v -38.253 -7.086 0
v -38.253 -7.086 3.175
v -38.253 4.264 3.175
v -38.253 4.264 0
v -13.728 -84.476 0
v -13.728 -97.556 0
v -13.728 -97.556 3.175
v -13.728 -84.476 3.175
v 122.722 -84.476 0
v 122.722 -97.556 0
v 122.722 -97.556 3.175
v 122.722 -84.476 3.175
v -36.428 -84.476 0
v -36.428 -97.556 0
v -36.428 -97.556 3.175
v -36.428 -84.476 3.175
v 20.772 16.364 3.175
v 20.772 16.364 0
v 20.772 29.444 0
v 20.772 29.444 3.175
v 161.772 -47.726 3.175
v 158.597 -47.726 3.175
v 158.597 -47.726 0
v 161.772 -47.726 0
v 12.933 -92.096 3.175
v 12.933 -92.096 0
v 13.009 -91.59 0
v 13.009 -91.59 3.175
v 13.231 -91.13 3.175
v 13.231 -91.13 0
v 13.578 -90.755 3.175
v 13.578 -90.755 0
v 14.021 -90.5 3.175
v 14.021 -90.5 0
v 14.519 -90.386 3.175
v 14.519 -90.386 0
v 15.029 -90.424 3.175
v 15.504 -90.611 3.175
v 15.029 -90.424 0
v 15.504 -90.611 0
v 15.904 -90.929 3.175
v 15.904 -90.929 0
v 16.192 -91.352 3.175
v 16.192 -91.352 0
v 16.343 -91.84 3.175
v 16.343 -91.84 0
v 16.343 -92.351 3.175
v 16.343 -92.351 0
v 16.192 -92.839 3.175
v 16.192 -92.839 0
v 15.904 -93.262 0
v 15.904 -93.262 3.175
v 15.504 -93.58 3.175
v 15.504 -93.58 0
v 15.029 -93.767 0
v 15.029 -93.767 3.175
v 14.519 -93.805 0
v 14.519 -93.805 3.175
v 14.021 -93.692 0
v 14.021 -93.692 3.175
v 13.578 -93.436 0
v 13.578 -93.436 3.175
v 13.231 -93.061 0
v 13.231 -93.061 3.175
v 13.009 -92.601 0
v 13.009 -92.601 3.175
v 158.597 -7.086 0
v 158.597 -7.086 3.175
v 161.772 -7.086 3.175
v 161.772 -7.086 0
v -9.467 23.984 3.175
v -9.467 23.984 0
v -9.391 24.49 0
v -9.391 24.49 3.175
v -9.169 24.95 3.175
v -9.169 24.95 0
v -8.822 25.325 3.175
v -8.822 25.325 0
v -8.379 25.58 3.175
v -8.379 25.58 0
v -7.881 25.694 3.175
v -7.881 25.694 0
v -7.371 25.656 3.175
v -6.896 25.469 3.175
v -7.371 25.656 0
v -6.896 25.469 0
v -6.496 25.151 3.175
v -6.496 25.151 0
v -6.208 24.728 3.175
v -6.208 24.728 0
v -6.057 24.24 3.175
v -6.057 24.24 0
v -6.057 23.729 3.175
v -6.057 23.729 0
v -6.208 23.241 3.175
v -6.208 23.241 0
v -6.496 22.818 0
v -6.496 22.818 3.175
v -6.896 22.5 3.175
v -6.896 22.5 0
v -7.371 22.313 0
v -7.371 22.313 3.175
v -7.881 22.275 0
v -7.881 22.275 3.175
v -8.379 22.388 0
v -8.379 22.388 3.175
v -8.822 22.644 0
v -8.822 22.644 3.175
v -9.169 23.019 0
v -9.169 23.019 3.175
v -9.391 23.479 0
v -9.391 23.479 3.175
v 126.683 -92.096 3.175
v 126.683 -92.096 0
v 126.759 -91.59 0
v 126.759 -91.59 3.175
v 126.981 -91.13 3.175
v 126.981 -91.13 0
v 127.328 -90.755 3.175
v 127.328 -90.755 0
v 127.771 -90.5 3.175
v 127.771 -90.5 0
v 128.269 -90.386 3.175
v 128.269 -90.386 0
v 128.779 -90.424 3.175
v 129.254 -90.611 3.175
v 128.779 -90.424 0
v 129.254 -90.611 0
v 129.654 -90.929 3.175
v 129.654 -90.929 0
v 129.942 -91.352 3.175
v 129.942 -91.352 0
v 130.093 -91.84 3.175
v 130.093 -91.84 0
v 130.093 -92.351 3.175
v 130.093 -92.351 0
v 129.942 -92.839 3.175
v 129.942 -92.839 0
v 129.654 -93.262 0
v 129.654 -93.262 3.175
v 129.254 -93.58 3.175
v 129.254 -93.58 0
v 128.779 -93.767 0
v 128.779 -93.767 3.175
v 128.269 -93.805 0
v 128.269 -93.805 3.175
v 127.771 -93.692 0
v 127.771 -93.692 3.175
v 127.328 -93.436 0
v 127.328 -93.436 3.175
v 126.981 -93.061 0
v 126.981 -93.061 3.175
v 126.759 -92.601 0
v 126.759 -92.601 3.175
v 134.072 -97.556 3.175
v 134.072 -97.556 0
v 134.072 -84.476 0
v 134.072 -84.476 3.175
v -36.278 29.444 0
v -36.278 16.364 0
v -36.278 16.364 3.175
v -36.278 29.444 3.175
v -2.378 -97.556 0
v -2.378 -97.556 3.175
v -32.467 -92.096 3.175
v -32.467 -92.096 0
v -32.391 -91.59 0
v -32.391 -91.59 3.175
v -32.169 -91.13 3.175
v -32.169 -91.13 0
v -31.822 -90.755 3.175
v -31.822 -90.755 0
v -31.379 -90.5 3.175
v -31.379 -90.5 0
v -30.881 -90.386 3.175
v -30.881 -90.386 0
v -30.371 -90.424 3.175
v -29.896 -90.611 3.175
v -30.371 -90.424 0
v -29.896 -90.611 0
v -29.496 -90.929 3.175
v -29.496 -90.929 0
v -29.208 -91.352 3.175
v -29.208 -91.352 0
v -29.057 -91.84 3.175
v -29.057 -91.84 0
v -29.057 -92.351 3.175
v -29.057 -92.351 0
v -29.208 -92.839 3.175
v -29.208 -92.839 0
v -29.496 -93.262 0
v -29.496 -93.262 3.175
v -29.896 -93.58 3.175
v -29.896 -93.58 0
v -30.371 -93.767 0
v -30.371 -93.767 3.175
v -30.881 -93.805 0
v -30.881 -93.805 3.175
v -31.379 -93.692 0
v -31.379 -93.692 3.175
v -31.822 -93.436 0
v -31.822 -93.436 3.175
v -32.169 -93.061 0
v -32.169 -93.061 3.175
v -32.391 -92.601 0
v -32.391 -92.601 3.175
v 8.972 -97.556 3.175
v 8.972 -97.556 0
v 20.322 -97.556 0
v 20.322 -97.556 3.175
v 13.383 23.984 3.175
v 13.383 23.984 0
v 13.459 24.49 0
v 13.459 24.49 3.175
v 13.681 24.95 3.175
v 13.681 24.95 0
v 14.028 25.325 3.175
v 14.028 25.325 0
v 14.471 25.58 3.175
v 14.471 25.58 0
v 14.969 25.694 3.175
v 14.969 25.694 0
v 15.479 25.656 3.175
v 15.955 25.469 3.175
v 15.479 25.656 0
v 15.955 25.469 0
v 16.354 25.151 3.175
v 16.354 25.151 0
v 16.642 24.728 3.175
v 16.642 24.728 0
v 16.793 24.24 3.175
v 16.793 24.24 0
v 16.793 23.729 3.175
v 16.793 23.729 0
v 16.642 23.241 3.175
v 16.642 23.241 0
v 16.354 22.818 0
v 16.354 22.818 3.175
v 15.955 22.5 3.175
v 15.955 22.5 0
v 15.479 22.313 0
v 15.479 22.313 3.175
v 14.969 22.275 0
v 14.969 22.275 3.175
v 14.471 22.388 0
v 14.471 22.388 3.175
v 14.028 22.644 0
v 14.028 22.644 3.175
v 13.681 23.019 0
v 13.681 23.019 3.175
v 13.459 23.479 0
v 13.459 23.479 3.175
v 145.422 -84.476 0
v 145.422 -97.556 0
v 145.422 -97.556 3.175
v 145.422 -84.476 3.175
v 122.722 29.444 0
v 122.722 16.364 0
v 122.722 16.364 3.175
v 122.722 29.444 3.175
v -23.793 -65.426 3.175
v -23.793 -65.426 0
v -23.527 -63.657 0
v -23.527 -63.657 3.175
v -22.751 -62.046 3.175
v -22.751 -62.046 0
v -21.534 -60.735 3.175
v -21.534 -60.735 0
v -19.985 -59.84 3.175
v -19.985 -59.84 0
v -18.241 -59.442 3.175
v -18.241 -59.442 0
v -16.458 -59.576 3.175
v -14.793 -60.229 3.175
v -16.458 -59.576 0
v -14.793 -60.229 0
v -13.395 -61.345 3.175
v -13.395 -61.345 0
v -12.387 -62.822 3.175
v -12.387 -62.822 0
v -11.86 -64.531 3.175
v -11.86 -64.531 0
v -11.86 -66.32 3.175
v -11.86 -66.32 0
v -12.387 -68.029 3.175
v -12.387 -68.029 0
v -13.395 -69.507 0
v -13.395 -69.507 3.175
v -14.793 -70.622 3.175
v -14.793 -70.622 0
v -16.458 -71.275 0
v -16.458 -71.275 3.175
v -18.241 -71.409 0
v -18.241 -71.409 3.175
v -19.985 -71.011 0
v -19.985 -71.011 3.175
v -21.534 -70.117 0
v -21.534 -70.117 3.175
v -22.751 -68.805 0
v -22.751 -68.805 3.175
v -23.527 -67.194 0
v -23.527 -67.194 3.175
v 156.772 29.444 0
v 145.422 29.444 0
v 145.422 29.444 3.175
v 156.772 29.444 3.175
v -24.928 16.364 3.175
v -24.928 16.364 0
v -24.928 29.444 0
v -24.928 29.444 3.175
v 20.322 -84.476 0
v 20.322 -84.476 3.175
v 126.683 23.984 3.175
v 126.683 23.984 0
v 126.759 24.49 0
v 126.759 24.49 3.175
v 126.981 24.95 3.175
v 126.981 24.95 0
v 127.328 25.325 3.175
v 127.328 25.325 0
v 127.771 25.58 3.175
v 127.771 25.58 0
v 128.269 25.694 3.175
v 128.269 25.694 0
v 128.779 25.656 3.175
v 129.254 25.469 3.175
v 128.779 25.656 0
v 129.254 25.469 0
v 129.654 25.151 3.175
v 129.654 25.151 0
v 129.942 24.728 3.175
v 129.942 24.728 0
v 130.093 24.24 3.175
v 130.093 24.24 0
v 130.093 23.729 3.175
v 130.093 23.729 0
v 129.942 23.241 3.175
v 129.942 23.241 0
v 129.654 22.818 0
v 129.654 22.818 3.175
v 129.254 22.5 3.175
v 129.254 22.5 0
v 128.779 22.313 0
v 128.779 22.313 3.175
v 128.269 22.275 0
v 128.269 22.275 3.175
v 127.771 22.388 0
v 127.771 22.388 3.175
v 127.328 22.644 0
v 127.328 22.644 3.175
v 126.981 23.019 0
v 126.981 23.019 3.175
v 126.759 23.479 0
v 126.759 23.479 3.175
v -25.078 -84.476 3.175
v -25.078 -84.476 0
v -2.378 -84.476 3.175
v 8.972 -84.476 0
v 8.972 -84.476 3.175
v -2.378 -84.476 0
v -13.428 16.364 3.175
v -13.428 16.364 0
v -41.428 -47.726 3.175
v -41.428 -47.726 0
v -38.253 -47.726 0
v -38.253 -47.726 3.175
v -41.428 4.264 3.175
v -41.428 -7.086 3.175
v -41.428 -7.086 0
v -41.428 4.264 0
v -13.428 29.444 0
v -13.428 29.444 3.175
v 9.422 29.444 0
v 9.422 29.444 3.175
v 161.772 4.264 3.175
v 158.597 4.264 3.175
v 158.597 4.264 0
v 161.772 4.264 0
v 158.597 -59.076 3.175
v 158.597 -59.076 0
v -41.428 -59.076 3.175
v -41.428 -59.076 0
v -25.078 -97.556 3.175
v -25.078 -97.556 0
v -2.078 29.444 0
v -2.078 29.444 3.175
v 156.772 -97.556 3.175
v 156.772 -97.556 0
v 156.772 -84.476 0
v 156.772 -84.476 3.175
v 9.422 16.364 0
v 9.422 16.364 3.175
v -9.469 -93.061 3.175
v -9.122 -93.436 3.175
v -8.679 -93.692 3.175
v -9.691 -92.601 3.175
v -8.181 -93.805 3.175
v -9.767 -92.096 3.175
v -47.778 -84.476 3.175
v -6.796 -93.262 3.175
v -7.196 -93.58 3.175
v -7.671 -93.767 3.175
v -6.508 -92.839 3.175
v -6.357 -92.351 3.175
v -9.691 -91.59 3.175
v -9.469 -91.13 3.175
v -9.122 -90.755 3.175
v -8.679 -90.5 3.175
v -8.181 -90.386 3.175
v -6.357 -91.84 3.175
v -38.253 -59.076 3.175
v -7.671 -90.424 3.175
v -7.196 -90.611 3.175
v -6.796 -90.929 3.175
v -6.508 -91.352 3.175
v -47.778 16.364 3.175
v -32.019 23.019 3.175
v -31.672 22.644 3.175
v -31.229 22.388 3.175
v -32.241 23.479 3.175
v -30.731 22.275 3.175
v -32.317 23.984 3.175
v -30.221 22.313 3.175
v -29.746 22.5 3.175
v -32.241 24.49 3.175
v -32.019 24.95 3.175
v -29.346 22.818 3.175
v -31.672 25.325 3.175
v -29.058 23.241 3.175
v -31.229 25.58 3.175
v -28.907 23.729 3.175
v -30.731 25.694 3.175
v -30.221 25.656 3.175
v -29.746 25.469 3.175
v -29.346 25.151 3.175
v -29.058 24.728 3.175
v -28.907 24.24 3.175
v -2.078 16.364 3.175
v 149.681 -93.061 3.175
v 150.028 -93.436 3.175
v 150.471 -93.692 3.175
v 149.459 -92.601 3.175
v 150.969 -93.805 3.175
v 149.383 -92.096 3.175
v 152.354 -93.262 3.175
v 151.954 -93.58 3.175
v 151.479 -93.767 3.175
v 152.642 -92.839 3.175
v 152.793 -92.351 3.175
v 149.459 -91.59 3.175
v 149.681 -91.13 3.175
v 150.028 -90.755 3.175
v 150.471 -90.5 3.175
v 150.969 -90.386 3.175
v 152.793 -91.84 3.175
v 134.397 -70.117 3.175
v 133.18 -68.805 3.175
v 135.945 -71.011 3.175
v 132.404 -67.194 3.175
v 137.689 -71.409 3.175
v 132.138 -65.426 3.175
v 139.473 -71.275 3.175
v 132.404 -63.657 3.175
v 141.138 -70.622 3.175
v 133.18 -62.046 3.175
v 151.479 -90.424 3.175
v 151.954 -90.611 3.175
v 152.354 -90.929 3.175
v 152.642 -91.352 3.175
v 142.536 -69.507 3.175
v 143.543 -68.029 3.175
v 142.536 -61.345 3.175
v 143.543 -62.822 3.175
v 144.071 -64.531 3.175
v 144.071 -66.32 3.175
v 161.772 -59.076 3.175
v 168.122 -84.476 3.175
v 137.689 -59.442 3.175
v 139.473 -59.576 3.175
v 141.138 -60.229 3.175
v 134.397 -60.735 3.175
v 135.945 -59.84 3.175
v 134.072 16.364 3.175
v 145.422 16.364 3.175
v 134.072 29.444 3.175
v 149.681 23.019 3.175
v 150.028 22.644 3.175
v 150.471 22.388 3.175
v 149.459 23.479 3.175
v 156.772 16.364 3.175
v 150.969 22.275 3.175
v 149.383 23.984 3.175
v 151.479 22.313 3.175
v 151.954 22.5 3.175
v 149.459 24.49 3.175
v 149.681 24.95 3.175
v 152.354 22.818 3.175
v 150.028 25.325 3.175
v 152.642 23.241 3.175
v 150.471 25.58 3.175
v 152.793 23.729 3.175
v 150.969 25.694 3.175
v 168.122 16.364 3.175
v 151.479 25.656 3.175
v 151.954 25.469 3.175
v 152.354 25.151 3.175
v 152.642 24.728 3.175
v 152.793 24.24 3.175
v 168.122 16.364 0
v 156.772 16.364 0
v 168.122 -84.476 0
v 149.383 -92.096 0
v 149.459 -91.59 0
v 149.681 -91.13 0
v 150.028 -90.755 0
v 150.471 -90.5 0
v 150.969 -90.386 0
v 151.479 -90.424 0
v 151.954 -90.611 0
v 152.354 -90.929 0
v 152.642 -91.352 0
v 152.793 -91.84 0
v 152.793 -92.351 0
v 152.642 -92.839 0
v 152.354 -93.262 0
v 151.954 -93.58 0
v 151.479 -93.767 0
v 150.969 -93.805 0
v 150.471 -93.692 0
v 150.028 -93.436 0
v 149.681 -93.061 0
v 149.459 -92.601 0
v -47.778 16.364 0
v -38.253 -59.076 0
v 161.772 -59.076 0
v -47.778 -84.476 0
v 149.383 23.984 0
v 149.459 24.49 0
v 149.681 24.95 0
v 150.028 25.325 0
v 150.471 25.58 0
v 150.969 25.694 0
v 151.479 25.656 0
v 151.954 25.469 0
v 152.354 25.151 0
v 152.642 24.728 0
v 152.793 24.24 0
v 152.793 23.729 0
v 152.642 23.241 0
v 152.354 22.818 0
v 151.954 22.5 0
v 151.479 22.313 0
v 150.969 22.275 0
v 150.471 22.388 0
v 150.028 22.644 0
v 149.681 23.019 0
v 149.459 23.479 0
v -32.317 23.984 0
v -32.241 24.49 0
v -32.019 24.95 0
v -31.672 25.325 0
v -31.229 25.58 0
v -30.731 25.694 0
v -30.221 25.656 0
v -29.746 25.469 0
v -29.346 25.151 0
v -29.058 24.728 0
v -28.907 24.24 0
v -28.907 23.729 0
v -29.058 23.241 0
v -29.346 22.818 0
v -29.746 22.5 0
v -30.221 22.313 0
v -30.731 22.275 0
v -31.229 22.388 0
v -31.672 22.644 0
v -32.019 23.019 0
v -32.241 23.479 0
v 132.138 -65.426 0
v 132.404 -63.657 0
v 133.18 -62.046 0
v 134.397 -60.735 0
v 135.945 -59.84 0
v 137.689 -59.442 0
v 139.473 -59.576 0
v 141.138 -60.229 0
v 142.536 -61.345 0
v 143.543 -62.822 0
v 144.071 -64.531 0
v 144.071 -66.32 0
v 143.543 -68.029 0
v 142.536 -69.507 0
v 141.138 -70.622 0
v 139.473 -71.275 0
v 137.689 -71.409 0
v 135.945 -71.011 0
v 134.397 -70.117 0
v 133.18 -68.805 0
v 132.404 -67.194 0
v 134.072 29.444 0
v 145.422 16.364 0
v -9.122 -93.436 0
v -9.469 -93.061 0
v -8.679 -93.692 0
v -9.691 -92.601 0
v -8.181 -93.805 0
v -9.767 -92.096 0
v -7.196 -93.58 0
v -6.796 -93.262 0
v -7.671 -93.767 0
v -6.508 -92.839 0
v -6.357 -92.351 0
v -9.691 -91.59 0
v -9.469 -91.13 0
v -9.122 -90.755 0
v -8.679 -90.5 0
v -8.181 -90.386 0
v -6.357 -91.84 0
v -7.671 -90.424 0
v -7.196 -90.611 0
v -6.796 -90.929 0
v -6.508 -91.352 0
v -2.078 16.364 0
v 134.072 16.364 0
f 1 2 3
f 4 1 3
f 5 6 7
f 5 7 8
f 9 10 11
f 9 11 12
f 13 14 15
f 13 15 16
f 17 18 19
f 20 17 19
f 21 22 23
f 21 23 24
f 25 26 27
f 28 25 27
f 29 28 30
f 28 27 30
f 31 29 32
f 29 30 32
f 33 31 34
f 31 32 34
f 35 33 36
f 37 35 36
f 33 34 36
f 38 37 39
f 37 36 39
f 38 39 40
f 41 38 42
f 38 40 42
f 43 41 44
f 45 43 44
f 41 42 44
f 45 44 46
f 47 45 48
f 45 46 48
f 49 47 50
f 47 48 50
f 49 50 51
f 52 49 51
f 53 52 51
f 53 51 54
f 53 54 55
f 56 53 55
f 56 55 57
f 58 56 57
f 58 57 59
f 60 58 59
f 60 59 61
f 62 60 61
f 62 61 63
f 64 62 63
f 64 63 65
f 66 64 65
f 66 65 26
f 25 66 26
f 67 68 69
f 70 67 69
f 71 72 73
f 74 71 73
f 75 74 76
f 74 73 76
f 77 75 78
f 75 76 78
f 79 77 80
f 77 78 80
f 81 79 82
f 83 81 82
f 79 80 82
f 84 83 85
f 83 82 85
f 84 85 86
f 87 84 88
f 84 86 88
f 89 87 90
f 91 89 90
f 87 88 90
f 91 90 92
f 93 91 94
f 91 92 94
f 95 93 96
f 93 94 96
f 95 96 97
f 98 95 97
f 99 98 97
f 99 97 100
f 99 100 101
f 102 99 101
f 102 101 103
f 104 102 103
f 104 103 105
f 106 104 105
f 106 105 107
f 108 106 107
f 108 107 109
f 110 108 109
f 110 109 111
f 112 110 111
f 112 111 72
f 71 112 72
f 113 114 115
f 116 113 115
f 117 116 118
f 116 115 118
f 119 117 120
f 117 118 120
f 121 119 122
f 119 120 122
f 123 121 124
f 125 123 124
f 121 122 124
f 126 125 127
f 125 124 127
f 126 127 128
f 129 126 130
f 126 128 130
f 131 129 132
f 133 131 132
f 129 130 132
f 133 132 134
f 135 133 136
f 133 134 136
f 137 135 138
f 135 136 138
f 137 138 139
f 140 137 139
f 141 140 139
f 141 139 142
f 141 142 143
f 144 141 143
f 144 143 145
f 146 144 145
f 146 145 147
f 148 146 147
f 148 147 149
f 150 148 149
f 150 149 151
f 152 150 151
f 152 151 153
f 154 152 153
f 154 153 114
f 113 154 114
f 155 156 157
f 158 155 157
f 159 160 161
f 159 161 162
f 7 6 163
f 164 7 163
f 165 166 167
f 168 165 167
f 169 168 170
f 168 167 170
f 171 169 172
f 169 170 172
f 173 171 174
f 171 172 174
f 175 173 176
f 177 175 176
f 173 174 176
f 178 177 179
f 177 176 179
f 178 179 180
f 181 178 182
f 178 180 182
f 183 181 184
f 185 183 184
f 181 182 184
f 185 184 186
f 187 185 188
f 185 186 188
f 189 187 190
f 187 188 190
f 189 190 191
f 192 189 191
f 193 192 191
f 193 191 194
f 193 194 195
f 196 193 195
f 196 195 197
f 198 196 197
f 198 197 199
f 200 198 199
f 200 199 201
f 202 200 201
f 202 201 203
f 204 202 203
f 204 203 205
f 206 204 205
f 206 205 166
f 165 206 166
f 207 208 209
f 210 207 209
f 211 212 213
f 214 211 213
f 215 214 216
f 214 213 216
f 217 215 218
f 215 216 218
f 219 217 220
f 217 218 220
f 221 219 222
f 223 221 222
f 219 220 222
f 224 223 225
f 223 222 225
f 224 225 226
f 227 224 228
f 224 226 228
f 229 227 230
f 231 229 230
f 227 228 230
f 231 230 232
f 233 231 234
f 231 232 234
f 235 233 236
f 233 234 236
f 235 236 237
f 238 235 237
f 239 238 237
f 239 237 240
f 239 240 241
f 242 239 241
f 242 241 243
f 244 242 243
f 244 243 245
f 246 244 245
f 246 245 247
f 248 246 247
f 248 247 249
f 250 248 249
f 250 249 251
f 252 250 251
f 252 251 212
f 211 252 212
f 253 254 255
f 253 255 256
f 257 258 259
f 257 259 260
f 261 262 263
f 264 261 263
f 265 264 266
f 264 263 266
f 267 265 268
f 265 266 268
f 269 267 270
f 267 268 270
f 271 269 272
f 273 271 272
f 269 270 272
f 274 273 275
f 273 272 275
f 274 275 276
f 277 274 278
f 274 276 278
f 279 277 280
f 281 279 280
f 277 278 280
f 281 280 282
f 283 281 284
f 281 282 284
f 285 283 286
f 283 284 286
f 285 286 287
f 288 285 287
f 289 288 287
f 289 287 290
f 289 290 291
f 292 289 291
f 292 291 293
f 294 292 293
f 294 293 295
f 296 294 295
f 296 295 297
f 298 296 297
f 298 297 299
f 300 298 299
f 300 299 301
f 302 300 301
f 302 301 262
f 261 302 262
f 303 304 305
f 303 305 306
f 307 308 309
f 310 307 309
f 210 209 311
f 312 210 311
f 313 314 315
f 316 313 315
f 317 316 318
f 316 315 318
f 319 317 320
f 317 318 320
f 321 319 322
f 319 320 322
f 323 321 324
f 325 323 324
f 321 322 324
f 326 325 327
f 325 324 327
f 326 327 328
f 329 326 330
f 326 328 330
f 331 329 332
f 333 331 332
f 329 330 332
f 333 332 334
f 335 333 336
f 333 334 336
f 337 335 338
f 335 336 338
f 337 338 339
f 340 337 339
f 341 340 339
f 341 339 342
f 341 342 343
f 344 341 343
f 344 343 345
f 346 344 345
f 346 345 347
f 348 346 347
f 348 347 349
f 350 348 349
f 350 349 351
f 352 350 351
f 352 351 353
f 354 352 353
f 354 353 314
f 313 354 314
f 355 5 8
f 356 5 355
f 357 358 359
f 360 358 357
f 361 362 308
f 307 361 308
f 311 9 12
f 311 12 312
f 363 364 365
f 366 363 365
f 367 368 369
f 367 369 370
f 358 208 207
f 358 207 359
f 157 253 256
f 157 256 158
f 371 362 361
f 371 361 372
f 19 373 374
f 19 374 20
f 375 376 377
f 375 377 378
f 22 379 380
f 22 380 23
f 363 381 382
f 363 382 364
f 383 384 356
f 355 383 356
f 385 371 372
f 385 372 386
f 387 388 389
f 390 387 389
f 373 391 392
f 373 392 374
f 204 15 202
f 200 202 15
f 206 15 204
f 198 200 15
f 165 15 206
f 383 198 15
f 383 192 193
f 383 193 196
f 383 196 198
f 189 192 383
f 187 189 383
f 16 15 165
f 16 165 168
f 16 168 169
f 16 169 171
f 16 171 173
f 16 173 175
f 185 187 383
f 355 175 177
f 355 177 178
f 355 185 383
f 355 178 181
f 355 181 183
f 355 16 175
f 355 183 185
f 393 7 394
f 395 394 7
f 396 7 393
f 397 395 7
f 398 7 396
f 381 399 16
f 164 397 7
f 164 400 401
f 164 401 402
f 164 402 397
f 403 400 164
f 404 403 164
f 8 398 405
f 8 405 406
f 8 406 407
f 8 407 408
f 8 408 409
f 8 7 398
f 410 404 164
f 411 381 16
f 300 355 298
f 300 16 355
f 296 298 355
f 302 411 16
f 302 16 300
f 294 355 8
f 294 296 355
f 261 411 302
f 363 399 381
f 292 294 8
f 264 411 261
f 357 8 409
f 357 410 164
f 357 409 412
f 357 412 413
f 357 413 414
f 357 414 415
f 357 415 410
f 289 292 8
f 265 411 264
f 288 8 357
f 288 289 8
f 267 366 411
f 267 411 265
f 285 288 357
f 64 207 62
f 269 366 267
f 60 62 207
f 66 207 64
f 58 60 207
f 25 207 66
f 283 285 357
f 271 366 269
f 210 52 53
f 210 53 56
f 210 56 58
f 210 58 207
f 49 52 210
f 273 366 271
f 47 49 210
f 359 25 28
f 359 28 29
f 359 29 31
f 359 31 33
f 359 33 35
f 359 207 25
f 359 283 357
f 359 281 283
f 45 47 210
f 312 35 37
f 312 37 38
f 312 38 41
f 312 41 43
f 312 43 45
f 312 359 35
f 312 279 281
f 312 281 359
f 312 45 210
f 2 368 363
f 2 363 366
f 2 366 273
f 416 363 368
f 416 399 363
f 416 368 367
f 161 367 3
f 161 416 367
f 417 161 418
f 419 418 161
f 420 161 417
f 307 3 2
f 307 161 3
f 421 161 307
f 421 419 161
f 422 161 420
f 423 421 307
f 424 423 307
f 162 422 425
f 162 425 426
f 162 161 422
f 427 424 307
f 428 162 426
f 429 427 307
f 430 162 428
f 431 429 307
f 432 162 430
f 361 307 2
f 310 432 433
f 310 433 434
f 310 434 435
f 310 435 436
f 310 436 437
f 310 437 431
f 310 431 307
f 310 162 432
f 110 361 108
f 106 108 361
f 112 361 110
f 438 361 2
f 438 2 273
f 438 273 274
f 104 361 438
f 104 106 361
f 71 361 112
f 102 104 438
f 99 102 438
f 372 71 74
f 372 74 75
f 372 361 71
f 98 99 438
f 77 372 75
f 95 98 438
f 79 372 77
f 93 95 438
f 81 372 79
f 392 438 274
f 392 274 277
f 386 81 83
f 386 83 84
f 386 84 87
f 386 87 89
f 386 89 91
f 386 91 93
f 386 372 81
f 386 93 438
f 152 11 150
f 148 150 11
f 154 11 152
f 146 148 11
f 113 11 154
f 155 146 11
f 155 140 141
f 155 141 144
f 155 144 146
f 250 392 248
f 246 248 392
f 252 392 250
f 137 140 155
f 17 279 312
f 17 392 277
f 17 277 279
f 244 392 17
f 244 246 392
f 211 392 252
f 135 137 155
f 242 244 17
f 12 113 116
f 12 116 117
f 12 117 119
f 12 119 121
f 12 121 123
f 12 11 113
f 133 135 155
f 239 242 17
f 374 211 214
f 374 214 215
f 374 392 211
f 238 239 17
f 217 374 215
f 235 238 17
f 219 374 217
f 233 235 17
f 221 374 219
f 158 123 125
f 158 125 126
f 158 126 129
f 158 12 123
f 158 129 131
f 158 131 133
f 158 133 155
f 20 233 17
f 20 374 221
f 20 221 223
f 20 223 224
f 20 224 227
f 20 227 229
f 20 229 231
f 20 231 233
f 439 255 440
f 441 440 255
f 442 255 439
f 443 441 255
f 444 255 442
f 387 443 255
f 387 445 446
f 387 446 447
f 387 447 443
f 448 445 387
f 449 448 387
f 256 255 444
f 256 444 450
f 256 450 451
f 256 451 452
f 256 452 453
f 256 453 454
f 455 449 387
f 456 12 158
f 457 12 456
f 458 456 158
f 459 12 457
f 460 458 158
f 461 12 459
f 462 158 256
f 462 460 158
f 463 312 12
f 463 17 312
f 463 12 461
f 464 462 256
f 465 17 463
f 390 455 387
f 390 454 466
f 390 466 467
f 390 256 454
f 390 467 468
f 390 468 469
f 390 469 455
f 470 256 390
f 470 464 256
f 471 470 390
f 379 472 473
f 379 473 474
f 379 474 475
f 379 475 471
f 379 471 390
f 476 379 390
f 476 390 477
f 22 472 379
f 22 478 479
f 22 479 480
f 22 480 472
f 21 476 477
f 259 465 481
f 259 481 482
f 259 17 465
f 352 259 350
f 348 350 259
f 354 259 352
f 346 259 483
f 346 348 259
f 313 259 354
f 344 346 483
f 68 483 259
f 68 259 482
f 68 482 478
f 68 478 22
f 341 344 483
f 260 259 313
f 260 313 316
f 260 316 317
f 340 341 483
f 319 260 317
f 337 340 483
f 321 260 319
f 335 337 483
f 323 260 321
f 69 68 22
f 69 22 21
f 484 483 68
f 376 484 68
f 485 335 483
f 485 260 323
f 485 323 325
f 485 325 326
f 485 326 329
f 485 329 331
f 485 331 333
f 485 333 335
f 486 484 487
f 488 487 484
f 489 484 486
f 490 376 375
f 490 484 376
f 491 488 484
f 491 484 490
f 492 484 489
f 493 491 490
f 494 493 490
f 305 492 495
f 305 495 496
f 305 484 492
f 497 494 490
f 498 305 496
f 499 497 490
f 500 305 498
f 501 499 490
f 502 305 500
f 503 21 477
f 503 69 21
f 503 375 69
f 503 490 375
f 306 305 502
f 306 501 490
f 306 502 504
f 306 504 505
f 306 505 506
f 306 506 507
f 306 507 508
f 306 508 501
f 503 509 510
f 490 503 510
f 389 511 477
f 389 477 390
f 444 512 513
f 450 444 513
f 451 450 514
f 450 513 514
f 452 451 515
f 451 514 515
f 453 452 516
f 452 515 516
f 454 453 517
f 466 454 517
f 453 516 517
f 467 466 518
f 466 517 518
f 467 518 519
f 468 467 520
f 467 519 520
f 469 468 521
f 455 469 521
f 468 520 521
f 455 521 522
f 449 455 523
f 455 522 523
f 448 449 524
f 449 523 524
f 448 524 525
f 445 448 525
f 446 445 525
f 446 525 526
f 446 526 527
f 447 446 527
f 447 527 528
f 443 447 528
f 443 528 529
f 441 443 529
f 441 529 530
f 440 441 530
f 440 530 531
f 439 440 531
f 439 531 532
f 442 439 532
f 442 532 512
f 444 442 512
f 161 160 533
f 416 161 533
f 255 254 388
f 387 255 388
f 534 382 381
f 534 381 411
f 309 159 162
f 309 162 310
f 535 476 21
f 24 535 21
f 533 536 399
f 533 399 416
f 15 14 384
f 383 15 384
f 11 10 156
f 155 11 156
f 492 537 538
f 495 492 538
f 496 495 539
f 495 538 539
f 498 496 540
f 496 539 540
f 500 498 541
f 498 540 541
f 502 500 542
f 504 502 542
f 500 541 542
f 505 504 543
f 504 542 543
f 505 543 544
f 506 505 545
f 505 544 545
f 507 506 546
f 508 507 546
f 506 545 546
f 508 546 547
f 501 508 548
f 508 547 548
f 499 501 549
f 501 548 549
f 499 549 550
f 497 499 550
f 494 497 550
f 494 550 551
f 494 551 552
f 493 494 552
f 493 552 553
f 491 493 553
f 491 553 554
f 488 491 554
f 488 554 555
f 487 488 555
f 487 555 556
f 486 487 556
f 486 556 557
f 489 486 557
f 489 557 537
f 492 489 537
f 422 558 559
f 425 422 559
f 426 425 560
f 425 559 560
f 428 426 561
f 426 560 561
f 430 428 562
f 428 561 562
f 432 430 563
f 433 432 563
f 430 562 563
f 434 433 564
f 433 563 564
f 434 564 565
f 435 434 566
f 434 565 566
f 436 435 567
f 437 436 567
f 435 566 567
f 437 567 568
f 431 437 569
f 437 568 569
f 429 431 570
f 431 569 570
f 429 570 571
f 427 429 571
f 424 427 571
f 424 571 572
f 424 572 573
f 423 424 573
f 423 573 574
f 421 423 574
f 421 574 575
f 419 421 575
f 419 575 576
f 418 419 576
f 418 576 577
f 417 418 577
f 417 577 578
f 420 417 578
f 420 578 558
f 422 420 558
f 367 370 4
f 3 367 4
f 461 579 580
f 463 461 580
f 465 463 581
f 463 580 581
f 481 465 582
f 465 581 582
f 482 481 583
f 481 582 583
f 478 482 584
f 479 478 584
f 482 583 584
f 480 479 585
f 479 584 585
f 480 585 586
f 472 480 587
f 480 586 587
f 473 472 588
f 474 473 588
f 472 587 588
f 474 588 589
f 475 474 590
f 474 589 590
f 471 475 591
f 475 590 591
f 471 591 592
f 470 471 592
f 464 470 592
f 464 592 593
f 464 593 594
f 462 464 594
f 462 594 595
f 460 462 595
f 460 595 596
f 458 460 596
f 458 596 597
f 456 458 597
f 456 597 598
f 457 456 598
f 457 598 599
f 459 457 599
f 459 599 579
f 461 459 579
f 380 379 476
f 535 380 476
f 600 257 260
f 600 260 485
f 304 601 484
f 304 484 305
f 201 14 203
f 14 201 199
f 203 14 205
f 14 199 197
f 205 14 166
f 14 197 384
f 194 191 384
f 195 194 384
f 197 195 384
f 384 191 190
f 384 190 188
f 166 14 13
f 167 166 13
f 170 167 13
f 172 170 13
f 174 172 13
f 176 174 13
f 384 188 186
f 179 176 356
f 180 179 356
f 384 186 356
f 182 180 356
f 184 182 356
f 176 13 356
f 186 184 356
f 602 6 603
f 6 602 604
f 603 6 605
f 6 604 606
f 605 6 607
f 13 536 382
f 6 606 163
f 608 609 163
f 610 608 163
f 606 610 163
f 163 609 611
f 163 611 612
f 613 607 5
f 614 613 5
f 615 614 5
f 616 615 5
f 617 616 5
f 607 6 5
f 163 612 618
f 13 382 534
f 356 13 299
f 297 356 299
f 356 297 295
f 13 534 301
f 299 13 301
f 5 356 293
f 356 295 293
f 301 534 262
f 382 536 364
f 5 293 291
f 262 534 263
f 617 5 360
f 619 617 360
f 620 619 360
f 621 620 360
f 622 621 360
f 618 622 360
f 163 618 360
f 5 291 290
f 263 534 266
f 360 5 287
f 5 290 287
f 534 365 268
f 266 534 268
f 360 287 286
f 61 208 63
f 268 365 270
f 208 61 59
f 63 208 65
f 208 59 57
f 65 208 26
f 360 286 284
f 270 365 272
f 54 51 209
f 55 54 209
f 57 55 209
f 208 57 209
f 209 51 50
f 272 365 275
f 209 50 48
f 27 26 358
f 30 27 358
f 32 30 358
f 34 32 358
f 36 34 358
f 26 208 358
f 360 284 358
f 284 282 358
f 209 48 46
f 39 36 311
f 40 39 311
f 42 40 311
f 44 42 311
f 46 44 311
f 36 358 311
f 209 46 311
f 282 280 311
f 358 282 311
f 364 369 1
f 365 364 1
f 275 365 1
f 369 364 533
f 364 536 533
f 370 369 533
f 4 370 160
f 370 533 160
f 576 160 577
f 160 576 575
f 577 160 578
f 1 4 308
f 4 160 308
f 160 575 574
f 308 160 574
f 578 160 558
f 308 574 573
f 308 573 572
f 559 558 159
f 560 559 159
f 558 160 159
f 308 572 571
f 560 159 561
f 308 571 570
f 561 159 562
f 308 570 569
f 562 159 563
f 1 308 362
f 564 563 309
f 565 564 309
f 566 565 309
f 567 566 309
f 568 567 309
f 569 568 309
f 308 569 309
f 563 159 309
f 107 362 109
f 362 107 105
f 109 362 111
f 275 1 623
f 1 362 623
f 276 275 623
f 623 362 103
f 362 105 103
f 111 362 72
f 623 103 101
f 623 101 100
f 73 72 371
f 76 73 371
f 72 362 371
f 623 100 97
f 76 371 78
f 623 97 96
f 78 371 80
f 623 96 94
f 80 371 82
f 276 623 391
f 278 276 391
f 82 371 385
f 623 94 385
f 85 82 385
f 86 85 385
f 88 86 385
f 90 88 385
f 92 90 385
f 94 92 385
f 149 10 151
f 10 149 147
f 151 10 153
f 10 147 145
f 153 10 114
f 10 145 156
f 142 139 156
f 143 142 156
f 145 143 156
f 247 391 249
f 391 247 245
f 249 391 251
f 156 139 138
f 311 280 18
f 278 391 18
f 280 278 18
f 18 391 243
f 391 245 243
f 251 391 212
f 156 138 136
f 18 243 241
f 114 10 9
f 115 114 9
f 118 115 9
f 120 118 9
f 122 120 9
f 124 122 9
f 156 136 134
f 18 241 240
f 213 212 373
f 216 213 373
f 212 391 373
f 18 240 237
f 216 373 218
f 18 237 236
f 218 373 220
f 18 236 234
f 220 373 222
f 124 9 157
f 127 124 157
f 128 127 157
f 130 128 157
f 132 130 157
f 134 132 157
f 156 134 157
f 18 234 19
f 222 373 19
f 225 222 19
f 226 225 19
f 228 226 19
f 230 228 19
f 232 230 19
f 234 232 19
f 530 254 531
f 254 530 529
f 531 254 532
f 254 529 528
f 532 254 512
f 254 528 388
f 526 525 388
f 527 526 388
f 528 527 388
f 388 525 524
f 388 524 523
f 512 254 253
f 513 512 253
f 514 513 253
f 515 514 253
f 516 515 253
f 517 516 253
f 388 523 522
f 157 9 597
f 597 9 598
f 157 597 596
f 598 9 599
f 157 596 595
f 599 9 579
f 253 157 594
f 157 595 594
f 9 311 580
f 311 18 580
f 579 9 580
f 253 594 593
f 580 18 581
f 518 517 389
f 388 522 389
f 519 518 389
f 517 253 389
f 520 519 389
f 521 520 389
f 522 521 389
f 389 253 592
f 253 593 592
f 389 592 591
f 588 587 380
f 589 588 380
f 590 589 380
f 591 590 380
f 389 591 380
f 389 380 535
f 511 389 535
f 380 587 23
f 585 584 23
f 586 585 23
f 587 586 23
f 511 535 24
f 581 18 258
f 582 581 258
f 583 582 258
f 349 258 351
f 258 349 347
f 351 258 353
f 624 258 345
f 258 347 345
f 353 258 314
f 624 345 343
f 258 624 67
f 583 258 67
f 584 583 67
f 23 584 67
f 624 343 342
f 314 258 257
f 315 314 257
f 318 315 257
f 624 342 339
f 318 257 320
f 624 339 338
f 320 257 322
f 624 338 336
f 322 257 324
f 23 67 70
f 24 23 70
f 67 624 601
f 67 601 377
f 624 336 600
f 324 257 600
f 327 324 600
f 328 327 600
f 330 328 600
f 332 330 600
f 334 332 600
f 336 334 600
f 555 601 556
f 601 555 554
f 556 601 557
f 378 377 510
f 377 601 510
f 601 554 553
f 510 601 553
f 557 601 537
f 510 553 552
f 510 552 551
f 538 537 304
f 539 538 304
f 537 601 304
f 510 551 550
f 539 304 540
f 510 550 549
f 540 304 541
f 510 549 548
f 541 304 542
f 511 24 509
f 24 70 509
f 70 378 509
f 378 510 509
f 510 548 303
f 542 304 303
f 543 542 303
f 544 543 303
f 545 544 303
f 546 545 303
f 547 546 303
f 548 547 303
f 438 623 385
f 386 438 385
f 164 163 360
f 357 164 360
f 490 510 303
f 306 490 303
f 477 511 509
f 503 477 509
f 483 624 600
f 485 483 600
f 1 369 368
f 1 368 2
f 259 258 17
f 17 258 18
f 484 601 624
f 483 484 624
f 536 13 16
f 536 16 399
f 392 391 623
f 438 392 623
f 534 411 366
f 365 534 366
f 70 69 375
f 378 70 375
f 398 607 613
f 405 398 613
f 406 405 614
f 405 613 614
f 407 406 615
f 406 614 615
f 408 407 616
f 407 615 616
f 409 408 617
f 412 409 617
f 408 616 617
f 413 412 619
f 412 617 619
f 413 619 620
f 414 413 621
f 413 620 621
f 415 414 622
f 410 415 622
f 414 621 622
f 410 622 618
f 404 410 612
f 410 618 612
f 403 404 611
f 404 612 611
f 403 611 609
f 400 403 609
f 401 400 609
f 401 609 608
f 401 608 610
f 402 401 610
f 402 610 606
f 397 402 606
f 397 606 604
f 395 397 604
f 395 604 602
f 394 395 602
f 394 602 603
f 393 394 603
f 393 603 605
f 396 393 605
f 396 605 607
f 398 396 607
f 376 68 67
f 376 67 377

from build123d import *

# Parameters (mm, degrees)
SKETCH1_W               = 215.9
SKETCH1_H               = 127
BOSS_EXTRUDE1_DEPTH     = 3.175
SKETCH4_W               = 11.35
SKETCH4_H               = 13.0800094
SKETCH4_W_2             = 101.949970282
SKETCH4_W_3             = 11.50001
SKETCH4_W_4             = 102.400000282
CUT_EXTRUDE1_DEPTH      = 4.175
SKETCH5_R               = 6
CUT_EXTRUDE2_DEPTH      = 1
CUT_EXTRUDE2_DEPTH_BACK = 4.175
SKETCH6_R               = 1.7145
CUT_EXTRUDE3_DEPTH      = 4.175
SKETCH10_W              = 3.175
SKETCH10_H              = 11.34999
CUT_EXTRUDE4_DEPTH      = 3.175


with BuildPart() as part:
    # Sketch1 → Boss-Extrude1 (new body)
    with BuildSketch(Plane.XY):
        with Locations((60.172222222, -34.055555556)):
            Rectangle(SKETCH1_W, SKETCH1_H)
    extrude(amount=BOSS_EXTRUDE1_DEPTH)

    # Sketch4 → Cut-Extrude1 (cut, through all)
    with BuildSketch(Plane(origin=(0, 0, 0), x_dir=(-1, 0, 0), z_dir=(0, 0, -1))):
        with Locations((-162.447222222, 22.904439744)):
            Rectangle(SKETCH4_W, SKETCH4_H)
        with Locations((-139.747222222, 22.904439744)):
            Rectangle(SKETCH4_W, SKETCH4_H)
        with Locations((-71.747237175, 22.904439744)):
            Rectangle(SKETCH4_W_2, SKETCH4_H)
        with Locations((-3.672247128, 22.904439744)):
            Rectangle(SKETCH4_W_3, SKETCH4_H)
        with Locations((19.177762872, 22.904439744)):
            Rectangle(SKETCH4_W_3, SKETCH4_H)
        with Locations((42.027772778, 22.904439744)):
            Rectangle(SKETCH4_W_3, SKETCH4_H)
        with Locations((-162.447222222, -91.015550856)):
            Rectangle(SKETCH4_W, SKETCH4_H)
        with Locations((-139.747222222, -91.015550856)):
            Rectangle(SKETCH4_W, SKETCH4_H)
        with Locations((-71.522222175, -91.015550856)):
            Rectangle(SKETCH4_W_4, SKETCH4_H)
        with Locations((-3.297222034, -91.015550856)):
            Rectangle(SKETCH4_W, SKETCH4_H)
        with Locations((19.402777872, -91.015550856)):
            Rectangle(SKETCH4_W, SKETCH4_H)
        with Locations((42.102777778, -91.015550856)):
            Rectangle(SKETCH4_W, SKETCH4_H)
    extrude(amount=-CUT_EXTRUDE1_DEPTH, mode=Mode.SUBTRACT)

    # Sketch5 → Cut-Extrude2 (cut, two sides)
    with BuildSketch(Plane(origin=(0, 0, 0), x_dir=(-1, 0, 0), z_dir=(0, 0, -1))) as cut_extrude2_sk:
        with Locations((-138.137522222, -65.425546156)):
            Circle(SKETCH5_R)
        with Locations((17.793077778, -65.425546156)):
            Circle(SKETCH5_R)
    extrude(amount=CUT_EXTRUDE2_DEPTH, mode=Mode.SUBTRACT)
    extrude(cut_extrude2_sk.sketch, amount=-CUT_EXTRUDE2_DEPTH_BACK, mode=Mode.SUBTRACT)

    # Sketch6 → Cut-Extrude3 (cut, through all)
    with BuildSketch(Plane(origin=(0, 0, 0), x_dir=(-1, 0, 0), z_dir=(0, 0, -1))):
        with Locations((-151.097222222, 23.984435044)):
            Circle(SKETCH6_R)
        with Locations((-128.397222269, 23.984435044)):
            Circle(SKETCH6_R)
        with Locations((-15.097252081, 23.984435044)):
            Circle(SKETCH6_R)
        with Locations((7.752757872, 23.984435044)):
            Circle(SKETCH6_R)
        with Locations((30.602767825, 23.984435044)):
            Circle(SKETCH6_R)
        with Locations((-128.397222269, -92.095546156)):
            Circle(SKETCH6_R)
        with Locations((-151.097222222, -92.095546156)):
            Circle(SKETCH6_R)
        with Locations((-14.647222034, -92.095546156)):
            Circle(SKETCH6_R)
        with Locations((8.052777919, -92.095546156)):
            Circle(SKETCH6_R)
        with Locations((30.752777825, -92.095546156)):
            Circle(SKETCH6_R)
    extrude(amount=-CUT_EXTRUDE3_DEPTH, mode=Mode.SUBTRACT)

    # Sketch10 → Cut-Extrude4 (cut)
    with BuildSketch(Plane.XY.offset(3.175)):
        with Locations((-39.840277778, -1.410561156)):
            Rectangle(SKETCH10_W, SKETCH10_H)
        with Locations((-39.840277778, -53.400551156)):
            Rectangle(SKETCH10_W, SKETCH10_H)
        with Locations((160.184722222, -1.410561156)):
            Rectangle(SKETCH10_W, SKETCH10_H)
        with Locations((160.184722222, -53.400551156)):
            Rectangle(SKETCH10_W, SKETCH10_H)
    extrude(amount=-CUT_EXTRUDE4_DEPTH, mode=Mode.SUBTRACT)


solid = part.part
